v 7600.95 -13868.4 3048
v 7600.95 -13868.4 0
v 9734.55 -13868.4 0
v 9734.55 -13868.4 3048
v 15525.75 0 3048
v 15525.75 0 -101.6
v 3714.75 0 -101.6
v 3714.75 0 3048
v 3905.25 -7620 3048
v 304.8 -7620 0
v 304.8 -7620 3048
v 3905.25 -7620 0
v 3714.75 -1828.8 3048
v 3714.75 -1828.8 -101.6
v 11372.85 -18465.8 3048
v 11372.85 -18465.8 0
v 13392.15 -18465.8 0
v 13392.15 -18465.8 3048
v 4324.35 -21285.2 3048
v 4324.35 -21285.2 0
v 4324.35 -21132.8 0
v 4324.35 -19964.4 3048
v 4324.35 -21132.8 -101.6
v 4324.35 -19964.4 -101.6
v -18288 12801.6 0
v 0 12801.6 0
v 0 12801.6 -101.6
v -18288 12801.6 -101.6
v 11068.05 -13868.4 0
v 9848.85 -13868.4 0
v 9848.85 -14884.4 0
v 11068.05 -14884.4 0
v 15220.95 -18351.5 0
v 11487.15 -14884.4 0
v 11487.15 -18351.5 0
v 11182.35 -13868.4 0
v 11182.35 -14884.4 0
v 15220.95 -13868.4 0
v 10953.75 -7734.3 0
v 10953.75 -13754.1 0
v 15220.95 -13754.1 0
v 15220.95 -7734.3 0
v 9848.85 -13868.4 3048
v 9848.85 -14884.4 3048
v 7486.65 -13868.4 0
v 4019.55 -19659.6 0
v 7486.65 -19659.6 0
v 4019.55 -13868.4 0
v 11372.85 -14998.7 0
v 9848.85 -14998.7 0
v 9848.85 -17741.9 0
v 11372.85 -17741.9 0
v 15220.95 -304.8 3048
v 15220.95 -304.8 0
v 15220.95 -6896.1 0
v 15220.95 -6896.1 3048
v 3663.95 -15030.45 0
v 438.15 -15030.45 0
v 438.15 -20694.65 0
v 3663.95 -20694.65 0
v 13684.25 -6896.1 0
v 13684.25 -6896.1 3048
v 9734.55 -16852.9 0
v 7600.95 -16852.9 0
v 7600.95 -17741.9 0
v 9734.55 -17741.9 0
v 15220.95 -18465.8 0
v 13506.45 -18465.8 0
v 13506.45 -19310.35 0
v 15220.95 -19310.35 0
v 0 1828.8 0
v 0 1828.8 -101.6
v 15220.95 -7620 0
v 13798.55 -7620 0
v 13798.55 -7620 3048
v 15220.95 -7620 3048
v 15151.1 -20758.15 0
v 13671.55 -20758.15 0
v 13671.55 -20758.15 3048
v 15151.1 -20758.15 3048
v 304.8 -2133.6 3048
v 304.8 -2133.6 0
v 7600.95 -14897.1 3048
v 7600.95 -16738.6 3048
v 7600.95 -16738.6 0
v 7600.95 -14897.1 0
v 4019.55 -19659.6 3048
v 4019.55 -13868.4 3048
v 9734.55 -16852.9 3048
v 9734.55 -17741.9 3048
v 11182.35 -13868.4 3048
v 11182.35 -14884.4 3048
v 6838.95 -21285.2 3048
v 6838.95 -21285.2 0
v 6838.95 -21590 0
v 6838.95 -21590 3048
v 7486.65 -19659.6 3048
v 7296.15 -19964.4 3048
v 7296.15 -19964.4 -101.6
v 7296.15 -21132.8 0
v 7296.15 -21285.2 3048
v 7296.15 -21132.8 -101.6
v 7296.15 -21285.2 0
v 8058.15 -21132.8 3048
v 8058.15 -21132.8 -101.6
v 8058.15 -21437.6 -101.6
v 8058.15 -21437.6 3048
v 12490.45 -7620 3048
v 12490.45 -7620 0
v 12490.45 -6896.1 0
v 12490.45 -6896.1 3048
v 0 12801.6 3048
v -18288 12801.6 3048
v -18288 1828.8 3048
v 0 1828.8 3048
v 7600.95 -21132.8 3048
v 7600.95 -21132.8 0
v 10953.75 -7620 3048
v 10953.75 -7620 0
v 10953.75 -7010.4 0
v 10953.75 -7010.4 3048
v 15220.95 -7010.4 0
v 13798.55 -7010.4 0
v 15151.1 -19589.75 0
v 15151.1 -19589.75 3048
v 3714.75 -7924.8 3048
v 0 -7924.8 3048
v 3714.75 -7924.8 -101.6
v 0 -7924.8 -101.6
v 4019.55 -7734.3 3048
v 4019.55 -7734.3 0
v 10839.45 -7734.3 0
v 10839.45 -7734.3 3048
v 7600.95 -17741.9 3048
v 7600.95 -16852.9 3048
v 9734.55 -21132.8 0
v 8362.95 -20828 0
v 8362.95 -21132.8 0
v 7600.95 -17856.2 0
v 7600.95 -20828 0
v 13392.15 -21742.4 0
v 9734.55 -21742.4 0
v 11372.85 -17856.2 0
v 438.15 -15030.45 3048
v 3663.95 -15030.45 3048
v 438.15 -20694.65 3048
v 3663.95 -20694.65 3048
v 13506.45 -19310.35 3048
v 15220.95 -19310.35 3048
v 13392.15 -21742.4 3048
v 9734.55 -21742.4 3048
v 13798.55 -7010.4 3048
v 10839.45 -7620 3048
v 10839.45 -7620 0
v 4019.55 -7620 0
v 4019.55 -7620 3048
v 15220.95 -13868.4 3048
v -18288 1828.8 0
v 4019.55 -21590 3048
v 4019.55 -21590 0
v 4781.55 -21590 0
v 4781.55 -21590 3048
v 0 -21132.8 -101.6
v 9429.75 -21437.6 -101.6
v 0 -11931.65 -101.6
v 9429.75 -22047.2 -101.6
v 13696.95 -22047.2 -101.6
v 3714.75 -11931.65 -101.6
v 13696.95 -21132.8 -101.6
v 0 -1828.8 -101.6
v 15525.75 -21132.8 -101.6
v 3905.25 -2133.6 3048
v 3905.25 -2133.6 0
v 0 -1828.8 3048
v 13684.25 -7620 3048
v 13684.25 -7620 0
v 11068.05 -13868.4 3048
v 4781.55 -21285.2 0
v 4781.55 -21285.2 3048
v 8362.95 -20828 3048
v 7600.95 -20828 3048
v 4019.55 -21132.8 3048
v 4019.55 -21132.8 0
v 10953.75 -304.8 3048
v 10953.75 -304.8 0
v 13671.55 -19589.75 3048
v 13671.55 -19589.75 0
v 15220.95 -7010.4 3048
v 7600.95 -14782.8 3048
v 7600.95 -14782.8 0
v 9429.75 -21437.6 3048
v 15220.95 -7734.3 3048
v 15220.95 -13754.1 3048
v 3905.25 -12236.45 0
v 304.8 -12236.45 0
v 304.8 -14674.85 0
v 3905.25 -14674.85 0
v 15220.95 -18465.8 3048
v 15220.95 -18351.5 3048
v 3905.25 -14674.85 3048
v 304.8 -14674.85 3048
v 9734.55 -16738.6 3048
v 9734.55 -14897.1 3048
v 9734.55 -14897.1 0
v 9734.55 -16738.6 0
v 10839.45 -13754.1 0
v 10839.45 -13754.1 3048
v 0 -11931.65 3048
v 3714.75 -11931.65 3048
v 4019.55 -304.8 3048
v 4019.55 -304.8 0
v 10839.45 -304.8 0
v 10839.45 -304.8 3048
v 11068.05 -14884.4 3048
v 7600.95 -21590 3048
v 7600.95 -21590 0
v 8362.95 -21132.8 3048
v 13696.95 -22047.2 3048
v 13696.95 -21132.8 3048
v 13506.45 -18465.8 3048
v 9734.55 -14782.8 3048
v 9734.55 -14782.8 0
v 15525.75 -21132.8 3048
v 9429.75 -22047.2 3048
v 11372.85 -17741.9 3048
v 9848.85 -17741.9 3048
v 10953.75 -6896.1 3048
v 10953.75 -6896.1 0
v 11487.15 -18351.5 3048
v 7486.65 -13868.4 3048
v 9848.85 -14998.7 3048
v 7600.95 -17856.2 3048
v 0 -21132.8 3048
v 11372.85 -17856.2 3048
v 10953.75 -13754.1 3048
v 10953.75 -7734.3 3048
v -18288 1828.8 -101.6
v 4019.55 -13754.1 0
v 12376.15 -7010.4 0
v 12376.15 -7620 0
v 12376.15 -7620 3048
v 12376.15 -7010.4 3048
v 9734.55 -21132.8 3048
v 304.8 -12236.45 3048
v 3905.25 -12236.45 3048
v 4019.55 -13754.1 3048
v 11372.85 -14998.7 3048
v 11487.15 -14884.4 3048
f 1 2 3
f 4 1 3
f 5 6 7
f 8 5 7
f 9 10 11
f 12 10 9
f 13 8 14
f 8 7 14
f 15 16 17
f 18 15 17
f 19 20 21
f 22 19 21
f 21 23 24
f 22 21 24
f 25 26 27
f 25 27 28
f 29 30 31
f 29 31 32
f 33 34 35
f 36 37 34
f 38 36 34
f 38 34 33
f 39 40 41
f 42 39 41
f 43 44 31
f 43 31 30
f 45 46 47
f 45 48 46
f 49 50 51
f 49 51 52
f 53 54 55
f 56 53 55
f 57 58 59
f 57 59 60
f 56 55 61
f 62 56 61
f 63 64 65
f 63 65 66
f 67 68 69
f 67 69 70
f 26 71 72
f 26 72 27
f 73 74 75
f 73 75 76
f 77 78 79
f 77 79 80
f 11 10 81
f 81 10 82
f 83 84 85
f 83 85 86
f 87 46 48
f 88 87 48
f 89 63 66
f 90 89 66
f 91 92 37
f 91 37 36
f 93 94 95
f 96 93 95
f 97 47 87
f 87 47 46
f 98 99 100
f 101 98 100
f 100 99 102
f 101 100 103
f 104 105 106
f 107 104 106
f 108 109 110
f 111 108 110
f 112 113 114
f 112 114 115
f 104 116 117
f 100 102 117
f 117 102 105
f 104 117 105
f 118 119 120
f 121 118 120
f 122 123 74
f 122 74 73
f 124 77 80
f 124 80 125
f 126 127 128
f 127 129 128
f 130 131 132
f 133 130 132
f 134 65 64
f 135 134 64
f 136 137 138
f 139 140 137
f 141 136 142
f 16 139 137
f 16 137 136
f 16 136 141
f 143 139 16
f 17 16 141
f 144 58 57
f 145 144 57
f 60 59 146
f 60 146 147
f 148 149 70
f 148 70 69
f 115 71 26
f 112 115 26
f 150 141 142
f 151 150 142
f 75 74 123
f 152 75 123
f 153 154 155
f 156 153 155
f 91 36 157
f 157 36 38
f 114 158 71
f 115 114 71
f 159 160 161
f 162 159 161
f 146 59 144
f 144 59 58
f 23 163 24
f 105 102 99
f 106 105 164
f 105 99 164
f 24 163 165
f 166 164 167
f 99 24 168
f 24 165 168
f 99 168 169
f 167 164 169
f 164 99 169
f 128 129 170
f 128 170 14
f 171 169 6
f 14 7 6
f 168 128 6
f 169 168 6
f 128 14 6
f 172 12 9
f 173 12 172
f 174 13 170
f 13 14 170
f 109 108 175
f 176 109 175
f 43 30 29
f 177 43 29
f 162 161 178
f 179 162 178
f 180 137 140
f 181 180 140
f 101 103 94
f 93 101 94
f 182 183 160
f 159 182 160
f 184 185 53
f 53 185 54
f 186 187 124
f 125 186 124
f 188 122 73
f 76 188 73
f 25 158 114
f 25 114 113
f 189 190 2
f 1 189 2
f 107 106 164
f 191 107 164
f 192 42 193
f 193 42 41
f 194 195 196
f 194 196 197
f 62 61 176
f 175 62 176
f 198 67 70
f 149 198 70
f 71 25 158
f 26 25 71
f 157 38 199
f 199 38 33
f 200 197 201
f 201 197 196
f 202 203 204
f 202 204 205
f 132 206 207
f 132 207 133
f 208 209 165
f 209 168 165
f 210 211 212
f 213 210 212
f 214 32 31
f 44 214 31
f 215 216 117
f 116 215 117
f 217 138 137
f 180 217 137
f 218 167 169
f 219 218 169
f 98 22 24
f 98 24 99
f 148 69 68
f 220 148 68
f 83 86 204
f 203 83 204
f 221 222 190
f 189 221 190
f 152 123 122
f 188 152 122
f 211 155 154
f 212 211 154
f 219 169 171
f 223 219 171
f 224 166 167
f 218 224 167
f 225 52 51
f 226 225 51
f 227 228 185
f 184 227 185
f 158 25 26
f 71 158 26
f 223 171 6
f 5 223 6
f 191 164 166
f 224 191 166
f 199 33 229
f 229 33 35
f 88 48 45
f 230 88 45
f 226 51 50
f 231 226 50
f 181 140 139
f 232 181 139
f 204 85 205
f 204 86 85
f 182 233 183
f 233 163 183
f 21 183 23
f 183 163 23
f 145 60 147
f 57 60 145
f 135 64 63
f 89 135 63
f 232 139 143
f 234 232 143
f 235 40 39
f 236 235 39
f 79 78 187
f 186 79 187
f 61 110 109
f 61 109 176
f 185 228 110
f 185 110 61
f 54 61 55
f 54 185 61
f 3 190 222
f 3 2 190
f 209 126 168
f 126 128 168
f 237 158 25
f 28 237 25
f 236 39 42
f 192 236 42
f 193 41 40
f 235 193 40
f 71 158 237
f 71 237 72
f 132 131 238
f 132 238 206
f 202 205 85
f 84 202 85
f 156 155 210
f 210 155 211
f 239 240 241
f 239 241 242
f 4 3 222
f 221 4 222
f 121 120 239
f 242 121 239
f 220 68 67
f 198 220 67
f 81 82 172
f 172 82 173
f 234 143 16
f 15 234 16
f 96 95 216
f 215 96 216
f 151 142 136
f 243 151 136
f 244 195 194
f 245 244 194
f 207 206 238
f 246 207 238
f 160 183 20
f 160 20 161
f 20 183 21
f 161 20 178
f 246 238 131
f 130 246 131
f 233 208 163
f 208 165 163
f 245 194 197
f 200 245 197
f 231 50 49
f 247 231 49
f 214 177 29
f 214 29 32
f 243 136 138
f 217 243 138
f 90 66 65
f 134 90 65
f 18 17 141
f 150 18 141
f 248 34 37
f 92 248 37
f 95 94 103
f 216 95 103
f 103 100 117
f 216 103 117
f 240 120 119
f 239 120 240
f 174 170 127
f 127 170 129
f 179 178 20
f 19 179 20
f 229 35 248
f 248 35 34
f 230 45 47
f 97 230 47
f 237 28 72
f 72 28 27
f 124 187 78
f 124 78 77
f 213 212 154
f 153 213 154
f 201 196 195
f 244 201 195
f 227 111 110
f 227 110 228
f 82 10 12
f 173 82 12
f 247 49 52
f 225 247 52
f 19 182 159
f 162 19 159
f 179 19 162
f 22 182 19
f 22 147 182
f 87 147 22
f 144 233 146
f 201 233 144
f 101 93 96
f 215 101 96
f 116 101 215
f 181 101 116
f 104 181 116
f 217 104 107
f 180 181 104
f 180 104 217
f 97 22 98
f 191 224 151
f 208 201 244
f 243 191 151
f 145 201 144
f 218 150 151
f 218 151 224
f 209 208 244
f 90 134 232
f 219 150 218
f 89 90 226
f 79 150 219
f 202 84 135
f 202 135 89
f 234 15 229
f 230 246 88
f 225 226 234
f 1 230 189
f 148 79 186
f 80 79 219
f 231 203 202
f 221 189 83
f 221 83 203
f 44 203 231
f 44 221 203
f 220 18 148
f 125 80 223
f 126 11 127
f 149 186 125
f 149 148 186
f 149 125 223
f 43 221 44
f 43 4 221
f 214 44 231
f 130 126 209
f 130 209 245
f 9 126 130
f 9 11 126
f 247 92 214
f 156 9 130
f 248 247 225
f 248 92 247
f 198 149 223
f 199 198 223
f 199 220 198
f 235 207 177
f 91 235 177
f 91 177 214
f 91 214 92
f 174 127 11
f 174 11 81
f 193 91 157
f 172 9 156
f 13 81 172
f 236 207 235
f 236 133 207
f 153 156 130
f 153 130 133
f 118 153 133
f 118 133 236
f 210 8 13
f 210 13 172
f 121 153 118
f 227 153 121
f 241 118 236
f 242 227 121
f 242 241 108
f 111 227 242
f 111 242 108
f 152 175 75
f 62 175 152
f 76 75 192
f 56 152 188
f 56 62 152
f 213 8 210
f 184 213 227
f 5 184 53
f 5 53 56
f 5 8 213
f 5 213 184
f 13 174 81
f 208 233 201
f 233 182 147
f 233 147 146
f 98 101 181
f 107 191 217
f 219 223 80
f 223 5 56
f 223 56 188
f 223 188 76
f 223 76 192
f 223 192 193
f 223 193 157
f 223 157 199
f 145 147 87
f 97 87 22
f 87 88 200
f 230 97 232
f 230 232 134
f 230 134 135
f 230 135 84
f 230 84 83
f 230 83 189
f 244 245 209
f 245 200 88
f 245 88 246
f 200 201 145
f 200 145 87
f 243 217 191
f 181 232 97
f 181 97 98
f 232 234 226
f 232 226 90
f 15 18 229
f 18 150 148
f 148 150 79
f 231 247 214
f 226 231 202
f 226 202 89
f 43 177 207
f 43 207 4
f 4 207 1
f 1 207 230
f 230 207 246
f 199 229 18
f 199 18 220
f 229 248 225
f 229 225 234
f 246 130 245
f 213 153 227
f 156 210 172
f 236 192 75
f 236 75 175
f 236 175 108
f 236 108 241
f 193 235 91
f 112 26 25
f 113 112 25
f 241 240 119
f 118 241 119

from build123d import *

# Parameters (mm, degrees)
F2_DEPTH = 101.6
F0_W     = 6096
F0_H     = 10972.8
F0_W_2   = 9144
F0_W_3   = 3048
F0_W_4   = 3600.45
F0_H_2   = 5486.4
F0_W_5   = 3225.8
F0_H_3   = 5664.2
F0_W_6   = 114.3
F0_H_4   = 6019.8
F0_H_5   = 609.6
F0_W_7   = 1422.4
F0_H_6   = 114.3
F0_W_8   = 1193.8
F0_H_7   = 76.2
F0_H_8   = 863.6
F0_W_9   = 254
F0_W_10  = 1219.2
F0_H_9   = 844.55
F0_W_11  = 1479.55
F0_H_10  = 1168.4
F3_DEPTH = 3048


with BuildPart() as f2:
    # F1 (on Top) → F2 (new body)
    with BuildSketch(Plane.XY):
        Polygon((3714.75, -11931.65), (0, -11931.65), (0, -21132.8), (4324.35, -21132.8), (4324.35, -19964.4), (7296.15, -19964.4), (7296.15, -21132.8), (8058.15, -21132.8), (8058.15, -21437.6), (9429.75, -21437.6), (9429.75, -22047.2), (13696.95, -22047.2), (13696.95, -21132.8), (15525.75, -21132.8), (15525.75, 0), (3714.75, 0), (3714.75, -1828.8), (0, -1828.8), (0, -7924.8), (3714.75, -7924.8), align=None)
    extrude(amount=-F2_DEPTH)

    # F0 (on Top) → F3 (join)
    with BuildSketch(Plane.XY):
        Polygon((15525.75, 0), (3714.75, 0), (3714.75, -1828.8), (0, -1828.8), (0, -7924.8), (3714.75, -7924.8), (3714.75, -11931.65), (0, -11931.65), (0, -14674.85), (304.8, -14674.85), (304.8, -12236.45), (3905.25, -12236.45), (3905.25, -14674.85), (4019.55, -14674.85), (4019.55, -13868.4), (4019.55, -13754.1), (4019.55, -7734.3), (4019.55, -7620), (4019.55, -304.8), (10839.45, -304.8), (10953.75, -304.8), (15220.95, -304.8), (15220.95, -6896.1), (15220.95, -7010.4), (15220.95, -7620), (15220.95, -7734.3), (15220.95, -13754.1), (15220.95, -13868.4), (15220.95, -18351.5), (15220.95, -18465.8), (15220.95, -19310.35), (15430.5, -19310.35), (15430.5, -21037.55), (13392.15, -21037.55), (13392.15, -21742.4), (9734.55, -21742.4), (9734.55, -21132.8), (8362.95, -21132.8), (8362.95, -20828), (7600.95, -20828), (7600.95, -19659.6), (7486.65, -19659.6), (4019.55, -19659.6), (4019.55, -21132.8), (4019.55, -21590), (4781.55, -21590), (4781.55, -21285.2), (4324.35, -21285.2), (4324.35, -19964.4), (7296.15, -19964.4), (7296.15, -21285.2), (6838.95, -21285.2), (6838.95, -21590), (7600.95, -21590), (7600.95, -21132.8), (8058.15, -21132.8), (8058.15, -21437.6), (9429.75, -21437.6), (9429.75, -22047.2), (13696.95, -22047.2), (13696.95, -21132.8), (15525.75, -21132.8), align=None)
        with Locations((2105.025, -4876.8)):
            Rectangle(F0_W_4, F0_H_2, mode=Mode.SUBTRACT)
        Polygon((304.8, -14674.85), (0, -14674.85), (0, -21132.8), (4019.55, -21132.8), (4019.55, -19659.6), (4019.55, -14674.85), (3905.25, -14674.85), align=None)
        with Locations((2051.05, -17862.55)):
            Rectangle(F0_W_5, F0_H_3, mode=Mode.SUBTRACT)
        Polygon((10839.45, -304.8), (10839.45, -7620), (10953.75, -7620), (10953.75, -7010.4), (10953.75, -6896.1), (10953.75, -304.8), align=None)
        Polygon((4019.55, -7620), (4019.55, -7734.3), (10839.45, -7734.3), (10953.75, -7734.3), (12376.15, -7734.3), (12376.15, -7620), (10953.75, -7620), (10839.45, -7620), align=None)
        with Locations((10896.6, -10744.2)):
            Rectangle(F0_W_6, F0_H_4)
        with Locations((12433.3, -7315.2)):
            Rectangle(F0_W_6, F0_H_5)
        with Locations((11664.95, -6953.25)):
            Rectangle(F0_W_7, F0_H_6)
        with Locations((12433.3, -6953.25)):
            Rectangle(F0_W_6, F0_H_6)
        with Locations((12433.3, -7677.15)):
            Rectangle(F0_W_6, F0_H_6)
        with Locations((13087.35, -7677.15)):
            Rectangle(F0_W_8, F0_H_6)
        with Locations((14509.75, -6953.25)):
            Rectangle(F0_W_7, F0_H_6)
        with Locations((13741.4, -6953.25)):
            Rectangle(F0_W_6, F0_H_6)
        with Locations((13741.4, -7315.2)):
            Rectangle(F0_W_6, F0_H_5)
        with Locations((13741.4, -7677.15)):
            Rectangle(F0_W_6, F0_H_6)
        with Locations((14509.75, -7677.15)):
            Rectangle(F0_W_7, F0_H_6)
        Polygon((10839.45, -13754.1), (9848.85, -13754.1), (9848.85, -13868.4), (11068.05, -13868.4), (11182.35, -13868.4), (15220.95, -13868.4), (15220.95, -13754.1), (10953.75, -13754.1), align=None)
        with Locations((11125.2, -13906.5)):
            Rectangle(F0_W_6, F0_H_7)
        with Locations((11125.2, -14846.3)):
            Rectangle(F0_W_6, F0_H_7)
        with Locations((11125.2, -14376.4)):
            Rectangle(F0_W_6, F0_H_8)
        Polygon((11372.85, -17741.9), (11372.85, -17856.2), (11487.15, -17856.2), (11487.15, -14884.4), (11182.35, -14884.4), (11068.05, -14884.4), (9848.85, -14884.4), (9848.85, -14998.7), (10763.25, -14998.7), (11372.85, -14998.7), (11372.85, -16217.9), (11372.85, -16929.1), align=None)
        Polygon((4019.55, -13754.1), (4019.55, -13868.4), (7486.65, -13868.4), (7600.95, -13868.4), (8515.35, -13868.4), (9734.55, -13868.4), (9848.85, -13868.4), (9848.85, -13754.1), align=None)
        Polygon((7486.65, -13868.4), (7486.65, -19659.6), (7600.95, -19659.6), (7600.95, -17856.2), (7600.95, -17741.9), (7600.95, -16852.9), (7600.95, -16738.6), (7600.95, -14897.1), (7600.95, -14782.8), (7600.95, -13868.4), align=None)
        Polygon((8515.35, -14782.8), (7600.95, -14782.8), (7600.95, -14897.1), (9124.95, -14897.1), (9734.55, -14897.1), (9734.55, -14782.8), align=None)
        Polygon((7600.95, -16738.6), (7600.95, -16852.9), (9734.55, -16852.9), (9734.55, -16738.6), (9124.95, -16738.6), align=None)
        Polygon((7600.95, -17741.9), (7600.95, -17856.2), (11372.85, -17856.2), (11372.85, -17741.9), (9848.85, -17741.9), (9734.55, -17741.9), align=None)
        Polygon((9848.85, -14884.4), (9848.85, -13868.4), (9734.55, -13868.4), (9734.55, -14782.8), (9734.55, -14897.1), (9734.55, -16738.6), (9734.55, -16852.9), (9734.55, -17741.9), (9848.85, -17741.9), (9848.85, -16929.1), (9848.85, -14998.7), align=None)
        Polygon((11487.15, -17856.2), (11372.85, -17856.2), (11372.85, -18465.8), (13392.15, -18465.8), (13506.45, -18465.8), (13747.75, -18465.8), (13747.75, -18351.5), (11487.15, -18351.5), align=None)
        with Locations((15093.95, -18408.65)):
            Rectangle(F0_W_9, F0_H_6)
        with Locations((14357.35, -18408.65)):
            Rectangle(F0_W_10, F0_H_6)
        with Locations((13449.3, -18888.075)):
            Rectangle(F0_W_6, F0_H_9)
        Polygon((13506.45, -19310.35), (13392.15, -19310.35), (13392.15, -21037.55), (15430.5, -21037.55), (15430.5, -19310.35), (15220.95, -19310.35), align=None)
        with Locations((14411.325, -20173.95)):
            Rectangle(F0_W_11, F0_H_10, mode=Mode.SUBTRACT)
    extrude(amount=F3_DEPTH)


with BuildPart() as f2b:
    # F0 (on Top) → F2, piece 2 (new body)
    with BuildSketch(Plane.XY):
        with Locations((-15240, 7315.2)):
            Rectangle(F0_W, F0_H)
        with Locations((-7620, 7315.2)):
            Rectangle(F0_W_2, F0_H)
        with Locations((-1524, 7315.2)):
            Rectangle(F0_W_3, F0_H)
    extrude(amount=-F2_DEPTH)


with BuildPart() as f3:
    # F0 (on Top) → F3, piece 2 (new body)
    with BuildSketch(Plane.XY):
        with Locations((-7620, 7315.2)):
            Rectangle(F0_W_2, F0_H)
        with Locations((-1524, 7315.2)):
            Rectangle(F0_W_3, F0_H)
        with Locations((-15240, 7315.2)):
            Rectangle(F0_W, F0_H)
    extrude(amount=F3_DEPTH)


solid = Compound([f2.part, f2b.part, f3.part])
